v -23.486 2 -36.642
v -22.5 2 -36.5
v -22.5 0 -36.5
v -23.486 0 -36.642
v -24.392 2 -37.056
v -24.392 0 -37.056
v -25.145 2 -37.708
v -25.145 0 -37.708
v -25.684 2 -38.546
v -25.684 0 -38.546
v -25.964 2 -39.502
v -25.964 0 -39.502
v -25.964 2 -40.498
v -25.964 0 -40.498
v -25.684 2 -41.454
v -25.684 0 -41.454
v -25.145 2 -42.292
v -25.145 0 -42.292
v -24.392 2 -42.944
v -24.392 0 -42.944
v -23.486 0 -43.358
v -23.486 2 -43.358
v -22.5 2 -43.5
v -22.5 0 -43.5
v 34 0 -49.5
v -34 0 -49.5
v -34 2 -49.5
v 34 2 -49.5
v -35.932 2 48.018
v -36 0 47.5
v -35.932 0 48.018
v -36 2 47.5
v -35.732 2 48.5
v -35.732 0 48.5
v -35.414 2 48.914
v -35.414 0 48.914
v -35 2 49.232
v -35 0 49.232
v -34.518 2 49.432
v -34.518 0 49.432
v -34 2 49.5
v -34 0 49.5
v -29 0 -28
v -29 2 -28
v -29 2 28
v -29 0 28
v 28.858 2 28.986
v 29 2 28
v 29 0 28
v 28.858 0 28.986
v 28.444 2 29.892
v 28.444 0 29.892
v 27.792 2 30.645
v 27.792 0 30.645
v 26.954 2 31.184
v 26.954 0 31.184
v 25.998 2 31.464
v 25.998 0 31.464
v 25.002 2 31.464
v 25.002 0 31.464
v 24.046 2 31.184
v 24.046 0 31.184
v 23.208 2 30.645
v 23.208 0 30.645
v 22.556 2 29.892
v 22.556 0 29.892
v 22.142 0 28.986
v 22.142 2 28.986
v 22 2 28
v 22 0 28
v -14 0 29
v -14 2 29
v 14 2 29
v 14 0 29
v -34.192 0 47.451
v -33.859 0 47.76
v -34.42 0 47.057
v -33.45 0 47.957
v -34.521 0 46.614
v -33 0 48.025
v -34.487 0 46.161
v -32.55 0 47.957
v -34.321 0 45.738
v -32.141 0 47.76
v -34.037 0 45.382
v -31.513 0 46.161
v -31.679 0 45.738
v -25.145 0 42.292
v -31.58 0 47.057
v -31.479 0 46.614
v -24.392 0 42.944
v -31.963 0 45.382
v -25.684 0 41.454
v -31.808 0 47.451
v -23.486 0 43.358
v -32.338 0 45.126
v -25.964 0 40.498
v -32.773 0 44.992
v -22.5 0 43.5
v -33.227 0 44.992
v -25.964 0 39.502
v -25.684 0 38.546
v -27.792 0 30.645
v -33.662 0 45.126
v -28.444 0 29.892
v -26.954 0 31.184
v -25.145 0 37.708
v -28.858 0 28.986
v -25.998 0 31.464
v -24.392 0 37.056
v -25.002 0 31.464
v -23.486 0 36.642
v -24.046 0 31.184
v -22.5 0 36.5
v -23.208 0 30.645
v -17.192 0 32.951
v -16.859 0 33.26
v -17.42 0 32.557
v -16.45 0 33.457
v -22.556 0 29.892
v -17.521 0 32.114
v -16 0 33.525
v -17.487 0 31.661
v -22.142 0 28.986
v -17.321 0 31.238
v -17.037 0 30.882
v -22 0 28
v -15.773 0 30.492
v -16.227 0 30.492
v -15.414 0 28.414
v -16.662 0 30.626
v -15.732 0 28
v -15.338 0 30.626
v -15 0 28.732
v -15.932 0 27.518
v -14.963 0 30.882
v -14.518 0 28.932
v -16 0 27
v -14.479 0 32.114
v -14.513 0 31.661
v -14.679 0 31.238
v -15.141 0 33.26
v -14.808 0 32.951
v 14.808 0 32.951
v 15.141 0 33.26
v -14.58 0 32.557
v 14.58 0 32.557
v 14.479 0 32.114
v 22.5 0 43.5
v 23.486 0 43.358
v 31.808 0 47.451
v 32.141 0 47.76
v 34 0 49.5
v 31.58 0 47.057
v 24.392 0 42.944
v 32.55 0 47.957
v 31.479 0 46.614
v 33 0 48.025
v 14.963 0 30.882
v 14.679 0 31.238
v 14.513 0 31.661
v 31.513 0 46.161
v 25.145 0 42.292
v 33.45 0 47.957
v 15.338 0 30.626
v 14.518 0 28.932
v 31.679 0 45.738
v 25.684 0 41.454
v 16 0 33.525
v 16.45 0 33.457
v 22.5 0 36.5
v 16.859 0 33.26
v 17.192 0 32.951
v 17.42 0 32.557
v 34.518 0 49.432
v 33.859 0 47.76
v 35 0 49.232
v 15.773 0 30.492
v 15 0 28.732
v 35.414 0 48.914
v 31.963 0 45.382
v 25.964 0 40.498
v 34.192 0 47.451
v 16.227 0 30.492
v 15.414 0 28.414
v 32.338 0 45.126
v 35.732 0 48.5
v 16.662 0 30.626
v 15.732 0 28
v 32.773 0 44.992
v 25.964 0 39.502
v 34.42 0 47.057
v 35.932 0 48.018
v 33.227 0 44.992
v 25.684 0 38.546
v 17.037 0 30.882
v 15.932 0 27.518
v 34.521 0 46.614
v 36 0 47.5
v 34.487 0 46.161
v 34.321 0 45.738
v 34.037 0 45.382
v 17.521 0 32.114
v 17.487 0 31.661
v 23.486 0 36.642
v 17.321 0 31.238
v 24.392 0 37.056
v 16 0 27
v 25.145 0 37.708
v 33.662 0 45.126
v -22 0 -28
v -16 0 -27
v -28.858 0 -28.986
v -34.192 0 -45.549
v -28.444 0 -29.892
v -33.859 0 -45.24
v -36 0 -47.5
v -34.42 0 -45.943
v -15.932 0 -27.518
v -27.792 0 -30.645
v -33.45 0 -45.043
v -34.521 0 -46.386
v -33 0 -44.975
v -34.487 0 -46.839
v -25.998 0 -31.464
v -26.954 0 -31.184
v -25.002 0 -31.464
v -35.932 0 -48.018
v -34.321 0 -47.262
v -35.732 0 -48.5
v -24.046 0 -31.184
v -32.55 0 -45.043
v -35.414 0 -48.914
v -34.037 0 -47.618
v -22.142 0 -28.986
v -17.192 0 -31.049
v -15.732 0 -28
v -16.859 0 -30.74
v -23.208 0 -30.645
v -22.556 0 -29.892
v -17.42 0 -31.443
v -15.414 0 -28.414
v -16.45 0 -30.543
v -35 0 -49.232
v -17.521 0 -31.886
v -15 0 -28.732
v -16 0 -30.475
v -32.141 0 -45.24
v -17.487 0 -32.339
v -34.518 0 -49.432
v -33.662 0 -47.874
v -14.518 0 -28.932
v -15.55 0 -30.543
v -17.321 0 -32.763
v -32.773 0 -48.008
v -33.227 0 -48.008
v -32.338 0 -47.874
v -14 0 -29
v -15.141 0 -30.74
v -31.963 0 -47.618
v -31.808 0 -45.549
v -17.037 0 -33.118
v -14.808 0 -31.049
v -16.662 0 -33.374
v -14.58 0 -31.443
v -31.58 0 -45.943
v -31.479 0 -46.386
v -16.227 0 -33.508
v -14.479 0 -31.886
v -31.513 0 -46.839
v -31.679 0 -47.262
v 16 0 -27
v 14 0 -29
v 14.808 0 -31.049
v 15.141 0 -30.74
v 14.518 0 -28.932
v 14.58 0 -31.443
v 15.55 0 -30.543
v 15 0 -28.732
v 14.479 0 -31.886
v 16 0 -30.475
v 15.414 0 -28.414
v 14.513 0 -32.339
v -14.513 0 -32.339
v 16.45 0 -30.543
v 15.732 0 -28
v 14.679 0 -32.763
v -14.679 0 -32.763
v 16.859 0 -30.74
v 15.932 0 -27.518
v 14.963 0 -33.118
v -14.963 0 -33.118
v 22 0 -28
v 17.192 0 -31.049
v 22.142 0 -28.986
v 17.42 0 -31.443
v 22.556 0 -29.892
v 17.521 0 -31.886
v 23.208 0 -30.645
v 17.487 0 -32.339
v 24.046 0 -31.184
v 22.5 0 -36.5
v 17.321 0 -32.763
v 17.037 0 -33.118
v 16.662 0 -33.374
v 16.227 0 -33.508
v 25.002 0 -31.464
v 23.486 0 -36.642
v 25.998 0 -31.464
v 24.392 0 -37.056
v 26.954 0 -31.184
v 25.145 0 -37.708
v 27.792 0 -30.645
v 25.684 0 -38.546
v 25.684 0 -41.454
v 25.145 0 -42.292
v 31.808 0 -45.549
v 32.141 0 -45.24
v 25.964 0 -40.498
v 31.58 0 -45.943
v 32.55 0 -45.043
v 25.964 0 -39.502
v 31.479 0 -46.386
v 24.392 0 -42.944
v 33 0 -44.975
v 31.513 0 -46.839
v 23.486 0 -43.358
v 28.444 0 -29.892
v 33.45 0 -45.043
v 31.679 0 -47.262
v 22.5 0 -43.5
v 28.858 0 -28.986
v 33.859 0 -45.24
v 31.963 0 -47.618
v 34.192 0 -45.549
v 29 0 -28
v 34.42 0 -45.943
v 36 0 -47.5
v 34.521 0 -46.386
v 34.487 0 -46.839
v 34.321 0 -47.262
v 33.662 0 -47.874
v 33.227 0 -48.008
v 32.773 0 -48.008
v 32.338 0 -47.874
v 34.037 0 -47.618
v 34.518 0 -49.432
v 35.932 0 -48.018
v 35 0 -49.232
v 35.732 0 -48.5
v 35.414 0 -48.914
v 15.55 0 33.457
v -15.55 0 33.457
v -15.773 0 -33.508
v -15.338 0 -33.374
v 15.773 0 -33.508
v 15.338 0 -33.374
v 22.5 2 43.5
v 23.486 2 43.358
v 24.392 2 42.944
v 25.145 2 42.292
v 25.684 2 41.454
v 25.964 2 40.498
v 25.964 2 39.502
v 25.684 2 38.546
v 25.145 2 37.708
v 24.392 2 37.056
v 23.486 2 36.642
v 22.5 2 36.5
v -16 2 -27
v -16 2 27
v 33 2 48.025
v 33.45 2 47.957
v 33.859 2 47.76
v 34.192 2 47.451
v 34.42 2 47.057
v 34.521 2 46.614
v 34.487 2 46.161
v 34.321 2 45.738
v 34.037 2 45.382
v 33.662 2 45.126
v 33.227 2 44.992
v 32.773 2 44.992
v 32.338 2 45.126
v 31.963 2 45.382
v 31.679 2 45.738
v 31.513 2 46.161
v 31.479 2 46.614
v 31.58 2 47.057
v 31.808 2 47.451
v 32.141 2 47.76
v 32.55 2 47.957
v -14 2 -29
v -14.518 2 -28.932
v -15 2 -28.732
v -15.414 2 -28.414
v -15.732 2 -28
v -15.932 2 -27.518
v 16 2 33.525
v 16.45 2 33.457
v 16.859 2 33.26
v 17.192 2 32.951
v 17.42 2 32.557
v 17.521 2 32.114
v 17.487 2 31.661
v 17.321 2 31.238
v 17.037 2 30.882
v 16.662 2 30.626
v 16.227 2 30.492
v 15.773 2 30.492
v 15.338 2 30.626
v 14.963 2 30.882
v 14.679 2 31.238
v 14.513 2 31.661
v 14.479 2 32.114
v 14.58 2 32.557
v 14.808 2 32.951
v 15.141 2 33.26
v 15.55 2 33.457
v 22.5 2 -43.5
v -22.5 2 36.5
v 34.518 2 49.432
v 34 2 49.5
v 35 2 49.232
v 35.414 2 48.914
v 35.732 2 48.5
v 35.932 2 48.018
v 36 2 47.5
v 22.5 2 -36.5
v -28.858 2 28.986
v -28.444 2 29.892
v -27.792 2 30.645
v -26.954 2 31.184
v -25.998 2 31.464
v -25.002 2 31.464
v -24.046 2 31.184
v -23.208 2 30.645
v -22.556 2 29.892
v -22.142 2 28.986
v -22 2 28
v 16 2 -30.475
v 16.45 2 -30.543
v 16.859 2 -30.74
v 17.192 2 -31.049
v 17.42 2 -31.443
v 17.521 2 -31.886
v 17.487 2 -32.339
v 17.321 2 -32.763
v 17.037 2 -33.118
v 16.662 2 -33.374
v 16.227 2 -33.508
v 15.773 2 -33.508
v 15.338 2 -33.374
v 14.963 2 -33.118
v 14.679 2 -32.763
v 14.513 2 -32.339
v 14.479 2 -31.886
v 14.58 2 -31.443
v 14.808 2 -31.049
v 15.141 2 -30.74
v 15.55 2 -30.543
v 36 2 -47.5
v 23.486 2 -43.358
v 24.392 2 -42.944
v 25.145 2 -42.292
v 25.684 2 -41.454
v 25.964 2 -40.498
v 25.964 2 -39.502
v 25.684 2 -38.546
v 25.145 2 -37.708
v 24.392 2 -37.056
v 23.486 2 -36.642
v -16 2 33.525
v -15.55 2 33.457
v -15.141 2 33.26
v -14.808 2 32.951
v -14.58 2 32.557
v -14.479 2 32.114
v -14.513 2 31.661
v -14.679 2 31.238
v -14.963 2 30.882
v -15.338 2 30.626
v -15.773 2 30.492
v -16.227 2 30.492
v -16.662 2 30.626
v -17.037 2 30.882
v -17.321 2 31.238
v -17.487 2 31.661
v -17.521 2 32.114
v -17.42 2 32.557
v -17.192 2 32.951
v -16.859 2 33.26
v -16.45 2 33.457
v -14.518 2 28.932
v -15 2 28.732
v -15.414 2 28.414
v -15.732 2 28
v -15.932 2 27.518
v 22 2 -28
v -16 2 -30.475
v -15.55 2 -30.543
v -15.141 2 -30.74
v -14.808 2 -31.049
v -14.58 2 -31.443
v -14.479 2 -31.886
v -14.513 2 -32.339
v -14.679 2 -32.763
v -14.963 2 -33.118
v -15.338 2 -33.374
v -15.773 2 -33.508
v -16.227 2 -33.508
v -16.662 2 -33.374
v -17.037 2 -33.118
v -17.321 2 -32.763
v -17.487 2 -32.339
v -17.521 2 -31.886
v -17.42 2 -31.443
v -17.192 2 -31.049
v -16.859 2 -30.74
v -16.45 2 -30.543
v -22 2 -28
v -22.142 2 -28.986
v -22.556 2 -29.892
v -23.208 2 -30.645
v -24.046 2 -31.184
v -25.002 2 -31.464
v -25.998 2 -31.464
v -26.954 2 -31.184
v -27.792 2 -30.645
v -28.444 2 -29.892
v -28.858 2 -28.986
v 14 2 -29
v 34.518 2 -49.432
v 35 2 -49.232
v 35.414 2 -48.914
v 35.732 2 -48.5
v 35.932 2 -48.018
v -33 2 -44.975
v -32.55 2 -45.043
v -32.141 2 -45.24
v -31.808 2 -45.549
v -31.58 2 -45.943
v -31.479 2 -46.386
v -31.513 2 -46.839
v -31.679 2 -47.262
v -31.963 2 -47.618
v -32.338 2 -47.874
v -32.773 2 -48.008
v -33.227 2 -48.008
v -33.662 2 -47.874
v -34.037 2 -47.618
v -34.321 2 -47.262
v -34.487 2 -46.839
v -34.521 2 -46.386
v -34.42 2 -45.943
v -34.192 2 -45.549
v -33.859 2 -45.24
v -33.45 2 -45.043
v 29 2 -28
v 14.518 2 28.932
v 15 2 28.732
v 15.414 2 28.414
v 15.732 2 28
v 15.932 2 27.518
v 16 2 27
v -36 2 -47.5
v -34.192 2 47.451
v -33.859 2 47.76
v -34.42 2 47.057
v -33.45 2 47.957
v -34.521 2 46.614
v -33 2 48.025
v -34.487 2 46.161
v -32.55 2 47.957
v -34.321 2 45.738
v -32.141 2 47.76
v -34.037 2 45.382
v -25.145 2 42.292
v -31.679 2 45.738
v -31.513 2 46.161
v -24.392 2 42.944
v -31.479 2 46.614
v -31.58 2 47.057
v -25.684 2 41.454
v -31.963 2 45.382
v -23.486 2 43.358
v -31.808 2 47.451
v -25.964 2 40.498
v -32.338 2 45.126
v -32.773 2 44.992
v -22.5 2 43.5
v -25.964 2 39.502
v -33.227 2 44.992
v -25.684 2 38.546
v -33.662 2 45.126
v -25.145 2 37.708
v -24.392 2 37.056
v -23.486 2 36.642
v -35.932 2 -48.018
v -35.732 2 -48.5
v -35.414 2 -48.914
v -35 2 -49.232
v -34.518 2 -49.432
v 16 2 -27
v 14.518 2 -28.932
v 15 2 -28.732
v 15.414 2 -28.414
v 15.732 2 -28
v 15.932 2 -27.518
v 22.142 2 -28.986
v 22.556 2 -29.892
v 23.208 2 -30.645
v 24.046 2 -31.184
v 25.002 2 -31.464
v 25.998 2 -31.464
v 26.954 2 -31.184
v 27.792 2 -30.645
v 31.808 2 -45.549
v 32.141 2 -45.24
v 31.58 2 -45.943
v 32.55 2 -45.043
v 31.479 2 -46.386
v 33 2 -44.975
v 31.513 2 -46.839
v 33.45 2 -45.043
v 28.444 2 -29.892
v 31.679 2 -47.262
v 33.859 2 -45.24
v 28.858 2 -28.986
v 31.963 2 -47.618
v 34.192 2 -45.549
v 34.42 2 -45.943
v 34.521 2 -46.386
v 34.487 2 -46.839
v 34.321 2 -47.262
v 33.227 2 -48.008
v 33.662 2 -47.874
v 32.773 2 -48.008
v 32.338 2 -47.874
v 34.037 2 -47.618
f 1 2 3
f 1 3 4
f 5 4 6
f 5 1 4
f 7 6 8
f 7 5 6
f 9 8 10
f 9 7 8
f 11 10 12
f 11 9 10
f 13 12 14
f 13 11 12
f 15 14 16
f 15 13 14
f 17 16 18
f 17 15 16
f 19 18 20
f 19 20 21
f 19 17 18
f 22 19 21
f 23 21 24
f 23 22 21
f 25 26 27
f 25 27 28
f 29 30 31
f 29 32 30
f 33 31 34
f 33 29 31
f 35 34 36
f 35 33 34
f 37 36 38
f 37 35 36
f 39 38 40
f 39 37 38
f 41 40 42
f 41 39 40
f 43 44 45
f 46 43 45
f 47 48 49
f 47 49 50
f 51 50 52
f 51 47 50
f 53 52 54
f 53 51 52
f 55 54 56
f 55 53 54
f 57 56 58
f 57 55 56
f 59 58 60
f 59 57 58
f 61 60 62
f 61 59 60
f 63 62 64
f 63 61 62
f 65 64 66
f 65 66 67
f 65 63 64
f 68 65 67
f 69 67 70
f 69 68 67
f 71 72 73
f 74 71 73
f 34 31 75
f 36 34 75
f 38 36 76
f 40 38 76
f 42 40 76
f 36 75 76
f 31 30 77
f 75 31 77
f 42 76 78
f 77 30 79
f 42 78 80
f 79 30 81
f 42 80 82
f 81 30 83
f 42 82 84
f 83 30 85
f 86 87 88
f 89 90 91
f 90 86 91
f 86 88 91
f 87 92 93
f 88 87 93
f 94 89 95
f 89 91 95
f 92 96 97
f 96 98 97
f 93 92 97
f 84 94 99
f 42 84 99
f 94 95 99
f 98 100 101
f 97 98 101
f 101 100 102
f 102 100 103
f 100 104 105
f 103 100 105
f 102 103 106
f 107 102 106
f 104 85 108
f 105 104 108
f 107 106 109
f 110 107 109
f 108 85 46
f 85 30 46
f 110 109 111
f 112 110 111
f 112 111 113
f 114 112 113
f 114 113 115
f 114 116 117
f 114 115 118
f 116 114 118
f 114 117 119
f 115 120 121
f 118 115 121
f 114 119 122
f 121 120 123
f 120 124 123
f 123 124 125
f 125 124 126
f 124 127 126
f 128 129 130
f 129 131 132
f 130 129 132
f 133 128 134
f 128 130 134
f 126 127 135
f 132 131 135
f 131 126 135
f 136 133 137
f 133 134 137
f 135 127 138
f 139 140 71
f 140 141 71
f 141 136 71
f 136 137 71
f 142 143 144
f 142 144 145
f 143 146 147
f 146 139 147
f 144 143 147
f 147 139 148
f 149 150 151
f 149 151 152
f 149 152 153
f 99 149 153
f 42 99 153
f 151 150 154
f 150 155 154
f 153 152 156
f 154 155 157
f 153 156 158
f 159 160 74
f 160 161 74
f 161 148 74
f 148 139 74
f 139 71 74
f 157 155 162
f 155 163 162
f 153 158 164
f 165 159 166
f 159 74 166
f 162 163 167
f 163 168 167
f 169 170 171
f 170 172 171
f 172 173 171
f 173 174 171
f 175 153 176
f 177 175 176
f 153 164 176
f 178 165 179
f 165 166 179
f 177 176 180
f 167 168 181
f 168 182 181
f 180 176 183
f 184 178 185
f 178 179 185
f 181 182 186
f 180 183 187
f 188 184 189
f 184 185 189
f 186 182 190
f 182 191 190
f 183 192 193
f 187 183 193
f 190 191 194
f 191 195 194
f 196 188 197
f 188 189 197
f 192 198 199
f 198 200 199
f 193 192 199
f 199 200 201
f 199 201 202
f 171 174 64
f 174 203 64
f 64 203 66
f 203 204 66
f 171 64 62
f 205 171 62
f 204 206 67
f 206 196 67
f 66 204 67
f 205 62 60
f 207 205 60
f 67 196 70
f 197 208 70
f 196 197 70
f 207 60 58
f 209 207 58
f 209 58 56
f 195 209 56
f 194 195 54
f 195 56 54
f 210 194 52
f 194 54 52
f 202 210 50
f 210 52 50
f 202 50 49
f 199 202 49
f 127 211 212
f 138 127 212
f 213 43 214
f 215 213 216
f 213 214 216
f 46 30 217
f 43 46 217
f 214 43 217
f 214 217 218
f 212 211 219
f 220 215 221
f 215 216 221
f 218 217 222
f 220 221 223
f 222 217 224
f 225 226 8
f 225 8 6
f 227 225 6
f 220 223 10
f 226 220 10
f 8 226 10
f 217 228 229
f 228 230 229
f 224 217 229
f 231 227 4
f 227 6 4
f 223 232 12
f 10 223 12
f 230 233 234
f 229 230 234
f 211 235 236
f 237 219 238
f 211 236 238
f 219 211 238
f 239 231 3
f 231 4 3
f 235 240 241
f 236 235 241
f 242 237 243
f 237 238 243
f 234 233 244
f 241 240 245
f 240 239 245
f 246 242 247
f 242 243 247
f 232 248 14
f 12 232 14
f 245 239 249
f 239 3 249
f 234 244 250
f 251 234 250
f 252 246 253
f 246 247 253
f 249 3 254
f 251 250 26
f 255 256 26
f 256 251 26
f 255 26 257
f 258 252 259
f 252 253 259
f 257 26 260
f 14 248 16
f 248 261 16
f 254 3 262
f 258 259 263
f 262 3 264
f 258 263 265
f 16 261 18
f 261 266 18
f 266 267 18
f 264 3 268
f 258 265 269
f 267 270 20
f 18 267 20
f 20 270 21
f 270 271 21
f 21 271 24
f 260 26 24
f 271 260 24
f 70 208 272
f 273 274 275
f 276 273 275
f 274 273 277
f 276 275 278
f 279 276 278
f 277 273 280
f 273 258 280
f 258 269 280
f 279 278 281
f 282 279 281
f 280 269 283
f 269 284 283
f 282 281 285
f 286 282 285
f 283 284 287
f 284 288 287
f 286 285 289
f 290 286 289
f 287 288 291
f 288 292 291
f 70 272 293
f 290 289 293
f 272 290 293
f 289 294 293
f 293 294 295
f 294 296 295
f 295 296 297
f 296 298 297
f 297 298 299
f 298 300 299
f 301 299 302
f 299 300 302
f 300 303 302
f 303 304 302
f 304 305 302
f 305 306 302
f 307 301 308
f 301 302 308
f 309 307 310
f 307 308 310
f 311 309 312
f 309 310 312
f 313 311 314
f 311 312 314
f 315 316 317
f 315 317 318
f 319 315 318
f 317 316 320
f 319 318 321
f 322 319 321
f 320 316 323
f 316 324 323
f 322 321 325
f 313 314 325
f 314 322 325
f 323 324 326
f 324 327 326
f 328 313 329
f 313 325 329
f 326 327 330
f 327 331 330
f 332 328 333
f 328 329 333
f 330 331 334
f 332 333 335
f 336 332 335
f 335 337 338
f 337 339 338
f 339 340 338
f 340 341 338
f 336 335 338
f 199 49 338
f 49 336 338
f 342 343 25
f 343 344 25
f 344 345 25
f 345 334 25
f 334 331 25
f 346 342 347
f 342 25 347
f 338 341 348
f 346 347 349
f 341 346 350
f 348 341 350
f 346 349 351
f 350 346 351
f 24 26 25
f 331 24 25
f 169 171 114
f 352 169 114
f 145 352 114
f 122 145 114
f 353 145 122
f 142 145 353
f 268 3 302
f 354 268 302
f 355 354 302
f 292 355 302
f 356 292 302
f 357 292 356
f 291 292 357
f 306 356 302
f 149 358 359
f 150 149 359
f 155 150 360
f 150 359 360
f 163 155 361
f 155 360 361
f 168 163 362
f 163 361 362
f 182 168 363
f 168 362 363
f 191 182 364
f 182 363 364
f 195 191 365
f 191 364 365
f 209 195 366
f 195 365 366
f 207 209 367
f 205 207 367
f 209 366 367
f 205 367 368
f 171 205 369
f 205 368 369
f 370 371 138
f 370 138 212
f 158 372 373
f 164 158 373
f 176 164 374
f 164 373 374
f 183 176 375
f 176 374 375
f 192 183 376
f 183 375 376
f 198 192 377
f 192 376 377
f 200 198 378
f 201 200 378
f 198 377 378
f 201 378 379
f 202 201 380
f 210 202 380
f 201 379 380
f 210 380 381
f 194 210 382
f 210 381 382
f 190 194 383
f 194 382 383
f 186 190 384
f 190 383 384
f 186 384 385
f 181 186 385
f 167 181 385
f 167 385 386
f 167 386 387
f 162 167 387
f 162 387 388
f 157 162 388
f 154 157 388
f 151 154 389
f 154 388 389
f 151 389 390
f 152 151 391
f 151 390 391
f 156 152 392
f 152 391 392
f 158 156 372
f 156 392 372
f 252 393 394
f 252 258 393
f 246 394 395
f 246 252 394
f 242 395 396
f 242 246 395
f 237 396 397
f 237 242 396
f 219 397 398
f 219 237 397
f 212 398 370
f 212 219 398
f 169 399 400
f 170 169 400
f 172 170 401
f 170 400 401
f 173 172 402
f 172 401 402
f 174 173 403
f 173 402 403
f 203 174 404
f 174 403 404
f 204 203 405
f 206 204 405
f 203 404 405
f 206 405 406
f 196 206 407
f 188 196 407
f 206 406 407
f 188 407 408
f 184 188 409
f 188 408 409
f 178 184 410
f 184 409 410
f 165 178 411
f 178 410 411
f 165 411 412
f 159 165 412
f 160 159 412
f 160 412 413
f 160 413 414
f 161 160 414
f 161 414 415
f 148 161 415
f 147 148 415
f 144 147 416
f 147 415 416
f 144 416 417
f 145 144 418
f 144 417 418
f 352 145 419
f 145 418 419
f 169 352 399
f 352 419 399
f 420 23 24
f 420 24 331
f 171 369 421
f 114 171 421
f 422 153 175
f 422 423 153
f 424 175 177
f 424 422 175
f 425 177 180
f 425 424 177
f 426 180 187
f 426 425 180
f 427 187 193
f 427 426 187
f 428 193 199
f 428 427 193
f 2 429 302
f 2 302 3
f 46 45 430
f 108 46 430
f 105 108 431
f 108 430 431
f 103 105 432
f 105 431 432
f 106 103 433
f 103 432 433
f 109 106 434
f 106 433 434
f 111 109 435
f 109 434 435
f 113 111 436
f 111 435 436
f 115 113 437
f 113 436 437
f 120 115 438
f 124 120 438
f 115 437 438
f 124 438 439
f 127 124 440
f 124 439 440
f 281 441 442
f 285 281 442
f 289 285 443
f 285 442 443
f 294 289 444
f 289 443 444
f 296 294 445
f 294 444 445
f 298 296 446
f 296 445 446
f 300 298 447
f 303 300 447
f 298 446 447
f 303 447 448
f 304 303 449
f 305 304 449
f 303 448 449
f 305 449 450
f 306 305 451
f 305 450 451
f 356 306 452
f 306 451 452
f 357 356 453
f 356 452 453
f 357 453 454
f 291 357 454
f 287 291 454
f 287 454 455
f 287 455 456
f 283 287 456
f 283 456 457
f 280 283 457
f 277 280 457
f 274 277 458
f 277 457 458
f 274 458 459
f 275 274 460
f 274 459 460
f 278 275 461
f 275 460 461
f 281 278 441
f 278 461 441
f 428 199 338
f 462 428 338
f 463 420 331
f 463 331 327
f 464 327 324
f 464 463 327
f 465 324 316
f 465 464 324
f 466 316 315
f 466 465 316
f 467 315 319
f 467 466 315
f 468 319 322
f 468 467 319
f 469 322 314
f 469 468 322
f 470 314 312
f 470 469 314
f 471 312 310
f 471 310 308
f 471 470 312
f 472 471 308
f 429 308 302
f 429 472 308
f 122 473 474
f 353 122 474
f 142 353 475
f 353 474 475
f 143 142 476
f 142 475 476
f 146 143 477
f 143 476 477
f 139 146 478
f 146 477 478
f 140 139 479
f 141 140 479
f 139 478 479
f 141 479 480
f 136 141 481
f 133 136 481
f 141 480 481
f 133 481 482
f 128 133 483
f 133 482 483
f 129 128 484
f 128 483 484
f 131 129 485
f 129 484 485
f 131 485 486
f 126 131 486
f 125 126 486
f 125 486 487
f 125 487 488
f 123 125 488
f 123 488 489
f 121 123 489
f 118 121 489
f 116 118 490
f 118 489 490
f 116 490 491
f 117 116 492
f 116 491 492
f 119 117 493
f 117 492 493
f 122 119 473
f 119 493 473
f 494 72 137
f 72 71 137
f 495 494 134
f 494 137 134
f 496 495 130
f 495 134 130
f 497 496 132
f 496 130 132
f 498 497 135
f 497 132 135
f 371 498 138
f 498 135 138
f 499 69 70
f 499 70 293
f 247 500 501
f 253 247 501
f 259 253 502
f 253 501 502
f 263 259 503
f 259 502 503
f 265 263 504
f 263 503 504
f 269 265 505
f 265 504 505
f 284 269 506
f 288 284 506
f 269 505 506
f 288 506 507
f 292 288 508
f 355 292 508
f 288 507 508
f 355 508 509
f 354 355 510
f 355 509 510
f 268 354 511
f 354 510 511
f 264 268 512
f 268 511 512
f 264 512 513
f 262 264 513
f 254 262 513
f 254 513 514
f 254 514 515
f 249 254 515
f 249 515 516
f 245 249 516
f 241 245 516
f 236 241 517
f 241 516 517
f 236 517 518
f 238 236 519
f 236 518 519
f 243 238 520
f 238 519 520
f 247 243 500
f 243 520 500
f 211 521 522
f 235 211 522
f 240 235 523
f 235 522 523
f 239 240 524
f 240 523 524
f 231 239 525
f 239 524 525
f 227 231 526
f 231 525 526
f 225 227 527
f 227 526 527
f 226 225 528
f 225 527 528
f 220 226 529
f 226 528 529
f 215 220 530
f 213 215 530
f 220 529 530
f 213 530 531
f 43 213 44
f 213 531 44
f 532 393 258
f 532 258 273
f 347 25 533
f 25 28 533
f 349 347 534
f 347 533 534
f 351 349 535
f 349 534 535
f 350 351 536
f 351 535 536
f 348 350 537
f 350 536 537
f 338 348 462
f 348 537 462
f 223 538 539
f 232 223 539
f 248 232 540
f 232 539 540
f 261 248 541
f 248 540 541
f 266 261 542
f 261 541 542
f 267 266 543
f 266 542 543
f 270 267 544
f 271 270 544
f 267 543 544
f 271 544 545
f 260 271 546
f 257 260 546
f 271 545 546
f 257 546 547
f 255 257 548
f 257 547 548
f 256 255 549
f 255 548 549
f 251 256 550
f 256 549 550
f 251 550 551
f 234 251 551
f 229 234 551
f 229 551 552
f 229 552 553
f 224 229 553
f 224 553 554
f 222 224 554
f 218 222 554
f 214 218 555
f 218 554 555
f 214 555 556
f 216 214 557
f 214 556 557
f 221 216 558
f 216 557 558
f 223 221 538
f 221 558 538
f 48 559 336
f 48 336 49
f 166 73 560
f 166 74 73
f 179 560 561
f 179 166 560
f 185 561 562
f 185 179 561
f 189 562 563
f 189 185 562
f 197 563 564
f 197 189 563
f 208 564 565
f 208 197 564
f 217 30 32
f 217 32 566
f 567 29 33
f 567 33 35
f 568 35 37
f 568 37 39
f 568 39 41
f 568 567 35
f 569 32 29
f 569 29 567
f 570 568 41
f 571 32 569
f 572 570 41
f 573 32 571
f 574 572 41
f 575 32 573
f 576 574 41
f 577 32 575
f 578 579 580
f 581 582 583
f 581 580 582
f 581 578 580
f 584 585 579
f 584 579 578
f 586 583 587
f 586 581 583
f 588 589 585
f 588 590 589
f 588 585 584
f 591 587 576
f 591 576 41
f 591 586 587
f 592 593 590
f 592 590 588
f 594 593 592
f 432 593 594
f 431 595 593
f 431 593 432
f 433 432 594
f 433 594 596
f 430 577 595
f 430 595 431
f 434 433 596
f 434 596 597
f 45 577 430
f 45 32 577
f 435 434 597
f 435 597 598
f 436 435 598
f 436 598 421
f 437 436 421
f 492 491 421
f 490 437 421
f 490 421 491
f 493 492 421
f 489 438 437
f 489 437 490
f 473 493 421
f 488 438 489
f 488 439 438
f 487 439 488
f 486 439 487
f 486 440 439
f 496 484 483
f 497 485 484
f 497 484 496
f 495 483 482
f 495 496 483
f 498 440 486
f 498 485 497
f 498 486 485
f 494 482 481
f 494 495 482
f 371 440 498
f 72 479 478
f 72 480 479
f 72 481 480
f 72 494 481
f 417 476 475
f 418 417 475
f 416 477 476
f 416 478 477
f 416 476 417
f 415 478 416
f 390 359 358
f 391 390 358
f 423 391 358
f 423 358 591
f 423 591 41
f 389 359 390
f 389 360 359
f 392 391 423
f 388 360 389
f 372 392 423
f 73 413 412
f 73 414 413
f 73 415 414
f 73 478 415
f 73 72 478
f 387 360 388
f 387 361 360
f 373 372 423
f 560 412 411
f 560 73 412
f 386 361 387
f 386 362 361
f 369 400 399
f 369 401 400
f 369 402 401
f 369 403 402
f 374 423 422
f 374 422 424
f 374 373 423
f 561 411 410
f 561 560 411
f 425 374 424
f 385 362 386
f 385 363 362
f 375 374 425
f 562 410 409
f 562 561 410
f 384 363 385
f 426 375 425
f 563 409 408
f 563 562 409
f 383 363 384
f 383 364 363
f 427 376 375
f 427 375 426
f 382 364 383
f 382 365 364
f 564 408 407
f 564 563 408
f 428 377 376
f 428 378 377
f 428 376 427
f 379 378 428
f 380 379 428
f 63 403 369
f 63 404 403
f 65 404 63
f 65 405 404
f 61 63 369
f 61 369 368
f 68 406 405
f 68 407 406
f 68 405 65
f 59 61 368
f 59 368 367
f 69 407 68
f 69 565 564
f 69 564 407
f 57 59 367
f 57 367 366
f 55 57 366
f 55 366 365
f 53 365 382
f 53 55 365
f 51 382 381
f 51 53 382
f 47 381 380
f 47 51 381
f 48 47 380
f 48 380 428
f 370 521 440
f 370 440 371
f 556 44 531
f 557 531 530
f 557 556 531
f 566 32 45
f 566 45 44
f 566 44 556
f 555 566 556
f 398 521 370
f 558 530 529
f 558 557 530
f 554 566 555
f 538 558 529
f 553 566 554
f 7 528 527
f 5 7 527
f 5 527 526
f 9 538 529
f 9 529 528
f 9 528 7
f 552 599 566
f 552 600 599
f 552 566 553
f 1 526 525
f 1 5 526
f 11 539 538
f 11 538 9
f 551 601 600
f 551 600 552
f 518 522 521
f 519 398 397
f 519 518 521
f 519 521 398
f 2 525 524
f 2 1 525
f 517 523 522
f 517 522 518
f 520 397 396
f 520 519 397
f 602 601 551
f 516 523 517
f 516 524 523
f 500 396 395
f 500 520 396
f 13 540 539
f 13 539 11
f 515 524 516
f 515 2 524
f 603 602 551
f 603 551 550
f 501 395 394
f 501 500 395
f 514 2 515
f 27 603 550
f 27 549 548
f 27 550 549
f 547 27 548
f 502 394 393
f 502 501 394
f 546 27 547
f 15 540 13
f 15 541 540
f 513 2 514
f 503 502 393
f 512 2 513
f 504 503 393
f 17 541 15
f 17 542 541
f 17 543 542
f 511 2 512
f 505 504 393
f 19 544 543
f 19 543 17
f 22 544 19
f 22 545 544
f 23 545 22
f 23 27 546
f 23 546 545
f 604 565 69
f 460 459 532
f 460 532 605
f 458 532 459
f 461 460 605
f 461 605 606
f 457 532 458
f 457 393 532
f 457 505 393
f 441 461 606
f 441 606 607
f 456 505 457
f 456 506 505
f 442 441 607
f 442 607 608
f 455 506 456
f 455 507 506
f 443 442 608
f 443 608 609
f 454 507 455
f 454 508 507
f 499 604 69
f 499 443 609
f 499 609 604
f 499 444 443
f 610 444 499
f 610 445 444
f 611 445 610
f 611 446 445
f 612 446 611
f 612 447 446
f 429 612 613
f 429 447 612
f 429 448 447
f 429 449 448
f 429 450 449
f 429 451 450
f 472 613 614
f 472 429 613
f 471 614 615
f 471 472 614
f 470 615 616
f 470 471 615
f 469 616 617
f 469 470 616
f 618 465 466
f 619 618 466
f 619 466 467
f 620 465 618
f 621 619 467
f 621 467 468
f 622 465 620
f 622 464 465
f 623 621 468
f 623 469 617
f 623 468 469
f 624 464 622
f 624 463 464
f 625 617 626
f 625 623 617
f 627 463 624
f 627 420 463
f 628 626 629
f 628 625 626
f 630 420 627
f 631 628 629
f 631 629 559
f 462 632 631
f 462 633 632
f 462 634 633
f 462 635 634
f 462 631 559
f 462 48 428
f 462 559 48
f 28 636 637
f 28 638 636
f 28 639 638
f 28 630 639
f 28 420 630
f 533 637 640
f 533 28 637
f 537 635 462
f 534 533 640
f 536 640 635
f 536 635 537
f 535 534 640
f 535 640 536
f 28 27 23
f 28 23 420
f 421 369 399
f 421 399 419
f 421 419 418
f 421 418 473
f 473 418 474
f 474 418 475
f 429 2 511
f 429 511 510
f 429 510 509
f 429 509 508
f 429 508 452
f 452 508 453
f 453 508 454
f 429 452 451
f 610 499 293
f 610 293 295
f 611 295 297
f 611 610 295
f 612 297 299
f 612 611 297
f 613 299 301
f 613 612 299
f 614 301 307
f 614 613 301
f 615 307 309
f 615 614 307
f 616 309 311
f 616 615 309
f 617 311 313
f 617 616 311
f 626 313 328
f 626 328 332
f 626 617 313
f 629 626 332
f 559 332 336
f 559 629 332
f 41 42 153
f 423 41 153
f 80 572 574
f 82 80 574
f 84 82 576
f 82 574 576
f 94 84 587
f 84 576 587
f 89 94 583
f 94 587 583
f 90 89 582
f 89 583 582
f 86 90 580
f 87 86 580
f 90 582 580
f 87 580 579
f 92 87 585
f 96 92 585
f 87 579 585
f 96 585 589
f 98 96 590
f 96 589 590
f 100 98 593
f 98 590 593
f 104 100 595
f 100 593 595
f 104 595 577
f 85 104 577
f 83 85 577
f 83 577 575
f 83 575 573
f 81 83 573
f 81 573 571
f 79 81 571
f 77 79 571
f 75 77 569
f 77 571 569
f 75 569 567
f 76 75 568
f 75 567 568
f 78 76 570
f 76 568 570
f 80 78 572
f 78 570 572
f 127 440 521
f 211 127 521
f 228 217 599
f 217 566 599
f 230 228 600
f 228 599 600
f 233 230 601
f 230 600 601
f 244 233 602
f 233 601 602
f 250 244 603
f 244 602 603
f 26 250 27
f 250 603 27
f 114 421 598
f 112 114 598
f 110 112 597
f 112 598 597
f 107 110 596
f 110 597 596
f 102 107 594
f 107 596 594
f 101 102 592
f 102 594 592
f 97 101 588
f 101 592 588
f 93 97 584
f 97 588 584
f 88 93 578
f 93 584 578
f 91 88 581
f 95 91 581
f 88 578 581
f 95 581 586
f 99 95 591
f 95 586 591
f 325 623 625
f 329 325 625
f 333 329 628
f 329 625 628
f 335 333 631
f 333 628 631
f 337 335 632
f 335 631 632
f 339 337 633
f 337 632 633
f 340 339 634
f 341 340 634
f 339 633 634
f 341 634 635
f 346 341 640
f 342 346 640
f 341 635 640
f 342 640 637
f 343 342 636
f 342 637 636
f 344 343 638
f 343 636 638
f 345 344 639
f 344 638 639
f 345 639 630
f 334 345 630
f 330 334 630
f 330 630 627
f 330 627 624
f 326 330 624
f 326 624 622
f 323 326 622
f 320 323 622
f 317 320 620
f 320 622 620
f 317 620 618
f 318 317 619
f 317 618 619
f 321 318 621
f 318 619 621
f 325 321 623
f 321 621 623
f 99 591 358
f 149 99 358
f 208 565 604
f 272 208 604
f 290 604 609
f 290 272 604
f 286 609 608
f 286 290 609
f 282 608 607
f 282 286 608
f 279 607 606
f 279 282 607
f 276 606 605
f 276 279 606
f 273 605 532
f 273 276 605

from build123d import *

# Parameters (mm, degrees)
SKETCH_1_W          = 72
SKETCH_1_H          = 99
EXTRUDE_1_DEPTH     = 2
SKETCH_3_R          = 1.525
CUT_EXTRUDE_1_DEPTH = 2
SKETCH_4_R          = 1.525
CUT_EXTRUDE_2_DEPTH = 2
SKETCH_5_W          = 32
SKETCH_5_H          = 58
CUT_EXTRUDE_3_DEPTH = 2
FILLET_1_R          = 2
CUT_EXTRUDE_4_DEPTH = 2
FILLET_2_R          = 2


with BuildPart() as part:
    # 草图1 → 凸台-拉伸1 (new body)
    with BuildSketch(Plane(origin=(0, 0, 0), x_dir=(1, 0, 0), z_dir=(0, 1, 0))):
        Rectangle(SKETCH_1_W, SKETCH_1_H)
    extrude(amount=EXTRUDE_1_DEPTH)

    # 草图3 → 切除-拉伸1 (cut)
    with BuildSketch(Plane(origin=(0, 2, 0), x_dir=(1, 0, 0), z_dir=(0, 1, 0))):
        with Locations(Location((33, 46.5, 0), (0, 0, 270))):
            Circle(SKETCH_3_R)
        with Locations(Location((-33, 46.5, 0), (0, 0, 270))):
            Circle(SKETCH_3_R)
        with Locations(Location((-33, -46.5, 0), (0, 0, 270))):
            Circle(SKETCH_3_R)
        with Locations(Location((33, -46.5, 0), (0, 0, 270))):
            Circle(SKETCH_3_R)
    extrude(amount=-CUT_EXTRUDE_1_DEPTH, mode=Mode.SUBTRACT)

    # 草图4 → 切除-拉伸2 (cut)
    with BuildSketch(Plane(origin=(0, 2, 0), x_dir=(1, 0, 0), z_dir=(0, 1, 0))):
        with Locations(Location((16, -32, 0), (0, 0, 270))):
            Circle(SKETCH_4_R)
        with Locations(Location((-16, -32, 0), (0, 0, 270))):
            Circle(SKETCH_4_R)
        with Locations(Location((-16, 32, 0), (0, 0, 270))):
            Circle(SKETCH_4_R)
        with Locations(Location((16, 32, 0), (0, 0, 270))):
            Circle(SKETCH_4_R)
    extrude(amount=-CUT_EXTRUDE_2_DEPTH, mode=Mode.SUBTRACT)

    # 草图5 → 切除-拉伸3 (cut)
    with BuildSketch(Plane(origin=(0, 2, 0), x_dir=(1, 0, 0), z_dir=(0, 1, 0))):
        Rectangle(SKETCH_5_W, SKETCH_5_H)
    extrude(amount=-CUT_EXTRUDE_3_DEPTH, mode=Mode.SUBTRACT)

    # 圆角1
    fillet_1_edges = [part.edges().sort_by_distance(p)[0] for p in [
        (16, 1, -29),
        (16, 1, 29),
        (-16, 1, 29),
        (-16, 1, -29),
    ]]
    fillet(fillet_1_edges, radius=FILLET_1_R)

    # 草图6 → 切除-拉伸4 (cut)
    with BuildSketch(Plane(origin=(0, 2, 0), x_dir=(1, 0, 0), z_dir=(0, 1, 0))):
        with BuildLine():
            Line((22, -28), (22, 28))
            ThreePointArc((22, 28), (25.5, 31.5), (29, 28))
            Line((29, 28), (29, -28))
            ThreePointArc((29, -28), (25.5, -31.5), (22, -28))
        make_face()
        with BuildLine():
            Line((-22, -28), (-22, 28))
            ThreePointArc((-22, 28), (-25.5, 31.5), (-29, 28))
            Line((-29, 28), (-29, -28))
            ThreePointArc((-29, -28), (-25.5, -31.5), (-22, -28))
        make_face()
        with BuildLine():
            Line((-22.5, 43.5), (22.5, 43.5))
            ThreePointArc((22.5, 43.5), (26, 40), (22.5, 36.5))
            Line((22.5, 36.5), (-22.5, 36.5))
            ThreePointArc((-22.5, 36.5), (-26, 40), (-22.5, 43.5))
        make_face()
        with BuildLine():
            Line((-22.5, -43.5), (22.5, -43.5))
            ThreePointArc((22.5, -43.5), (26, -40), (22.5, -36.5))
            Line((22.5, -36.5), (-22.5, -36.5))
            ThreePointArc((-22.5, -36.5), (-26, -40), (-22.5, -43.5))
        make_face()
    extrude(amount=-CUT_EXTRUDE_4_DEPTH, mode=Mode.SUBTRACT)

    # 圆角2
    fillet_2_edges = [part.edges().sort_by_distance(p)[0] for p in [
        (36, 1, 49.5),
        (-36, 1, 49.5),
        (-36, 1, -49.5),
        (36, 1, -49.5),
    ]]
    fillet(fillet_2_edges, radius=FILLET_2_R)


solid = part.part
